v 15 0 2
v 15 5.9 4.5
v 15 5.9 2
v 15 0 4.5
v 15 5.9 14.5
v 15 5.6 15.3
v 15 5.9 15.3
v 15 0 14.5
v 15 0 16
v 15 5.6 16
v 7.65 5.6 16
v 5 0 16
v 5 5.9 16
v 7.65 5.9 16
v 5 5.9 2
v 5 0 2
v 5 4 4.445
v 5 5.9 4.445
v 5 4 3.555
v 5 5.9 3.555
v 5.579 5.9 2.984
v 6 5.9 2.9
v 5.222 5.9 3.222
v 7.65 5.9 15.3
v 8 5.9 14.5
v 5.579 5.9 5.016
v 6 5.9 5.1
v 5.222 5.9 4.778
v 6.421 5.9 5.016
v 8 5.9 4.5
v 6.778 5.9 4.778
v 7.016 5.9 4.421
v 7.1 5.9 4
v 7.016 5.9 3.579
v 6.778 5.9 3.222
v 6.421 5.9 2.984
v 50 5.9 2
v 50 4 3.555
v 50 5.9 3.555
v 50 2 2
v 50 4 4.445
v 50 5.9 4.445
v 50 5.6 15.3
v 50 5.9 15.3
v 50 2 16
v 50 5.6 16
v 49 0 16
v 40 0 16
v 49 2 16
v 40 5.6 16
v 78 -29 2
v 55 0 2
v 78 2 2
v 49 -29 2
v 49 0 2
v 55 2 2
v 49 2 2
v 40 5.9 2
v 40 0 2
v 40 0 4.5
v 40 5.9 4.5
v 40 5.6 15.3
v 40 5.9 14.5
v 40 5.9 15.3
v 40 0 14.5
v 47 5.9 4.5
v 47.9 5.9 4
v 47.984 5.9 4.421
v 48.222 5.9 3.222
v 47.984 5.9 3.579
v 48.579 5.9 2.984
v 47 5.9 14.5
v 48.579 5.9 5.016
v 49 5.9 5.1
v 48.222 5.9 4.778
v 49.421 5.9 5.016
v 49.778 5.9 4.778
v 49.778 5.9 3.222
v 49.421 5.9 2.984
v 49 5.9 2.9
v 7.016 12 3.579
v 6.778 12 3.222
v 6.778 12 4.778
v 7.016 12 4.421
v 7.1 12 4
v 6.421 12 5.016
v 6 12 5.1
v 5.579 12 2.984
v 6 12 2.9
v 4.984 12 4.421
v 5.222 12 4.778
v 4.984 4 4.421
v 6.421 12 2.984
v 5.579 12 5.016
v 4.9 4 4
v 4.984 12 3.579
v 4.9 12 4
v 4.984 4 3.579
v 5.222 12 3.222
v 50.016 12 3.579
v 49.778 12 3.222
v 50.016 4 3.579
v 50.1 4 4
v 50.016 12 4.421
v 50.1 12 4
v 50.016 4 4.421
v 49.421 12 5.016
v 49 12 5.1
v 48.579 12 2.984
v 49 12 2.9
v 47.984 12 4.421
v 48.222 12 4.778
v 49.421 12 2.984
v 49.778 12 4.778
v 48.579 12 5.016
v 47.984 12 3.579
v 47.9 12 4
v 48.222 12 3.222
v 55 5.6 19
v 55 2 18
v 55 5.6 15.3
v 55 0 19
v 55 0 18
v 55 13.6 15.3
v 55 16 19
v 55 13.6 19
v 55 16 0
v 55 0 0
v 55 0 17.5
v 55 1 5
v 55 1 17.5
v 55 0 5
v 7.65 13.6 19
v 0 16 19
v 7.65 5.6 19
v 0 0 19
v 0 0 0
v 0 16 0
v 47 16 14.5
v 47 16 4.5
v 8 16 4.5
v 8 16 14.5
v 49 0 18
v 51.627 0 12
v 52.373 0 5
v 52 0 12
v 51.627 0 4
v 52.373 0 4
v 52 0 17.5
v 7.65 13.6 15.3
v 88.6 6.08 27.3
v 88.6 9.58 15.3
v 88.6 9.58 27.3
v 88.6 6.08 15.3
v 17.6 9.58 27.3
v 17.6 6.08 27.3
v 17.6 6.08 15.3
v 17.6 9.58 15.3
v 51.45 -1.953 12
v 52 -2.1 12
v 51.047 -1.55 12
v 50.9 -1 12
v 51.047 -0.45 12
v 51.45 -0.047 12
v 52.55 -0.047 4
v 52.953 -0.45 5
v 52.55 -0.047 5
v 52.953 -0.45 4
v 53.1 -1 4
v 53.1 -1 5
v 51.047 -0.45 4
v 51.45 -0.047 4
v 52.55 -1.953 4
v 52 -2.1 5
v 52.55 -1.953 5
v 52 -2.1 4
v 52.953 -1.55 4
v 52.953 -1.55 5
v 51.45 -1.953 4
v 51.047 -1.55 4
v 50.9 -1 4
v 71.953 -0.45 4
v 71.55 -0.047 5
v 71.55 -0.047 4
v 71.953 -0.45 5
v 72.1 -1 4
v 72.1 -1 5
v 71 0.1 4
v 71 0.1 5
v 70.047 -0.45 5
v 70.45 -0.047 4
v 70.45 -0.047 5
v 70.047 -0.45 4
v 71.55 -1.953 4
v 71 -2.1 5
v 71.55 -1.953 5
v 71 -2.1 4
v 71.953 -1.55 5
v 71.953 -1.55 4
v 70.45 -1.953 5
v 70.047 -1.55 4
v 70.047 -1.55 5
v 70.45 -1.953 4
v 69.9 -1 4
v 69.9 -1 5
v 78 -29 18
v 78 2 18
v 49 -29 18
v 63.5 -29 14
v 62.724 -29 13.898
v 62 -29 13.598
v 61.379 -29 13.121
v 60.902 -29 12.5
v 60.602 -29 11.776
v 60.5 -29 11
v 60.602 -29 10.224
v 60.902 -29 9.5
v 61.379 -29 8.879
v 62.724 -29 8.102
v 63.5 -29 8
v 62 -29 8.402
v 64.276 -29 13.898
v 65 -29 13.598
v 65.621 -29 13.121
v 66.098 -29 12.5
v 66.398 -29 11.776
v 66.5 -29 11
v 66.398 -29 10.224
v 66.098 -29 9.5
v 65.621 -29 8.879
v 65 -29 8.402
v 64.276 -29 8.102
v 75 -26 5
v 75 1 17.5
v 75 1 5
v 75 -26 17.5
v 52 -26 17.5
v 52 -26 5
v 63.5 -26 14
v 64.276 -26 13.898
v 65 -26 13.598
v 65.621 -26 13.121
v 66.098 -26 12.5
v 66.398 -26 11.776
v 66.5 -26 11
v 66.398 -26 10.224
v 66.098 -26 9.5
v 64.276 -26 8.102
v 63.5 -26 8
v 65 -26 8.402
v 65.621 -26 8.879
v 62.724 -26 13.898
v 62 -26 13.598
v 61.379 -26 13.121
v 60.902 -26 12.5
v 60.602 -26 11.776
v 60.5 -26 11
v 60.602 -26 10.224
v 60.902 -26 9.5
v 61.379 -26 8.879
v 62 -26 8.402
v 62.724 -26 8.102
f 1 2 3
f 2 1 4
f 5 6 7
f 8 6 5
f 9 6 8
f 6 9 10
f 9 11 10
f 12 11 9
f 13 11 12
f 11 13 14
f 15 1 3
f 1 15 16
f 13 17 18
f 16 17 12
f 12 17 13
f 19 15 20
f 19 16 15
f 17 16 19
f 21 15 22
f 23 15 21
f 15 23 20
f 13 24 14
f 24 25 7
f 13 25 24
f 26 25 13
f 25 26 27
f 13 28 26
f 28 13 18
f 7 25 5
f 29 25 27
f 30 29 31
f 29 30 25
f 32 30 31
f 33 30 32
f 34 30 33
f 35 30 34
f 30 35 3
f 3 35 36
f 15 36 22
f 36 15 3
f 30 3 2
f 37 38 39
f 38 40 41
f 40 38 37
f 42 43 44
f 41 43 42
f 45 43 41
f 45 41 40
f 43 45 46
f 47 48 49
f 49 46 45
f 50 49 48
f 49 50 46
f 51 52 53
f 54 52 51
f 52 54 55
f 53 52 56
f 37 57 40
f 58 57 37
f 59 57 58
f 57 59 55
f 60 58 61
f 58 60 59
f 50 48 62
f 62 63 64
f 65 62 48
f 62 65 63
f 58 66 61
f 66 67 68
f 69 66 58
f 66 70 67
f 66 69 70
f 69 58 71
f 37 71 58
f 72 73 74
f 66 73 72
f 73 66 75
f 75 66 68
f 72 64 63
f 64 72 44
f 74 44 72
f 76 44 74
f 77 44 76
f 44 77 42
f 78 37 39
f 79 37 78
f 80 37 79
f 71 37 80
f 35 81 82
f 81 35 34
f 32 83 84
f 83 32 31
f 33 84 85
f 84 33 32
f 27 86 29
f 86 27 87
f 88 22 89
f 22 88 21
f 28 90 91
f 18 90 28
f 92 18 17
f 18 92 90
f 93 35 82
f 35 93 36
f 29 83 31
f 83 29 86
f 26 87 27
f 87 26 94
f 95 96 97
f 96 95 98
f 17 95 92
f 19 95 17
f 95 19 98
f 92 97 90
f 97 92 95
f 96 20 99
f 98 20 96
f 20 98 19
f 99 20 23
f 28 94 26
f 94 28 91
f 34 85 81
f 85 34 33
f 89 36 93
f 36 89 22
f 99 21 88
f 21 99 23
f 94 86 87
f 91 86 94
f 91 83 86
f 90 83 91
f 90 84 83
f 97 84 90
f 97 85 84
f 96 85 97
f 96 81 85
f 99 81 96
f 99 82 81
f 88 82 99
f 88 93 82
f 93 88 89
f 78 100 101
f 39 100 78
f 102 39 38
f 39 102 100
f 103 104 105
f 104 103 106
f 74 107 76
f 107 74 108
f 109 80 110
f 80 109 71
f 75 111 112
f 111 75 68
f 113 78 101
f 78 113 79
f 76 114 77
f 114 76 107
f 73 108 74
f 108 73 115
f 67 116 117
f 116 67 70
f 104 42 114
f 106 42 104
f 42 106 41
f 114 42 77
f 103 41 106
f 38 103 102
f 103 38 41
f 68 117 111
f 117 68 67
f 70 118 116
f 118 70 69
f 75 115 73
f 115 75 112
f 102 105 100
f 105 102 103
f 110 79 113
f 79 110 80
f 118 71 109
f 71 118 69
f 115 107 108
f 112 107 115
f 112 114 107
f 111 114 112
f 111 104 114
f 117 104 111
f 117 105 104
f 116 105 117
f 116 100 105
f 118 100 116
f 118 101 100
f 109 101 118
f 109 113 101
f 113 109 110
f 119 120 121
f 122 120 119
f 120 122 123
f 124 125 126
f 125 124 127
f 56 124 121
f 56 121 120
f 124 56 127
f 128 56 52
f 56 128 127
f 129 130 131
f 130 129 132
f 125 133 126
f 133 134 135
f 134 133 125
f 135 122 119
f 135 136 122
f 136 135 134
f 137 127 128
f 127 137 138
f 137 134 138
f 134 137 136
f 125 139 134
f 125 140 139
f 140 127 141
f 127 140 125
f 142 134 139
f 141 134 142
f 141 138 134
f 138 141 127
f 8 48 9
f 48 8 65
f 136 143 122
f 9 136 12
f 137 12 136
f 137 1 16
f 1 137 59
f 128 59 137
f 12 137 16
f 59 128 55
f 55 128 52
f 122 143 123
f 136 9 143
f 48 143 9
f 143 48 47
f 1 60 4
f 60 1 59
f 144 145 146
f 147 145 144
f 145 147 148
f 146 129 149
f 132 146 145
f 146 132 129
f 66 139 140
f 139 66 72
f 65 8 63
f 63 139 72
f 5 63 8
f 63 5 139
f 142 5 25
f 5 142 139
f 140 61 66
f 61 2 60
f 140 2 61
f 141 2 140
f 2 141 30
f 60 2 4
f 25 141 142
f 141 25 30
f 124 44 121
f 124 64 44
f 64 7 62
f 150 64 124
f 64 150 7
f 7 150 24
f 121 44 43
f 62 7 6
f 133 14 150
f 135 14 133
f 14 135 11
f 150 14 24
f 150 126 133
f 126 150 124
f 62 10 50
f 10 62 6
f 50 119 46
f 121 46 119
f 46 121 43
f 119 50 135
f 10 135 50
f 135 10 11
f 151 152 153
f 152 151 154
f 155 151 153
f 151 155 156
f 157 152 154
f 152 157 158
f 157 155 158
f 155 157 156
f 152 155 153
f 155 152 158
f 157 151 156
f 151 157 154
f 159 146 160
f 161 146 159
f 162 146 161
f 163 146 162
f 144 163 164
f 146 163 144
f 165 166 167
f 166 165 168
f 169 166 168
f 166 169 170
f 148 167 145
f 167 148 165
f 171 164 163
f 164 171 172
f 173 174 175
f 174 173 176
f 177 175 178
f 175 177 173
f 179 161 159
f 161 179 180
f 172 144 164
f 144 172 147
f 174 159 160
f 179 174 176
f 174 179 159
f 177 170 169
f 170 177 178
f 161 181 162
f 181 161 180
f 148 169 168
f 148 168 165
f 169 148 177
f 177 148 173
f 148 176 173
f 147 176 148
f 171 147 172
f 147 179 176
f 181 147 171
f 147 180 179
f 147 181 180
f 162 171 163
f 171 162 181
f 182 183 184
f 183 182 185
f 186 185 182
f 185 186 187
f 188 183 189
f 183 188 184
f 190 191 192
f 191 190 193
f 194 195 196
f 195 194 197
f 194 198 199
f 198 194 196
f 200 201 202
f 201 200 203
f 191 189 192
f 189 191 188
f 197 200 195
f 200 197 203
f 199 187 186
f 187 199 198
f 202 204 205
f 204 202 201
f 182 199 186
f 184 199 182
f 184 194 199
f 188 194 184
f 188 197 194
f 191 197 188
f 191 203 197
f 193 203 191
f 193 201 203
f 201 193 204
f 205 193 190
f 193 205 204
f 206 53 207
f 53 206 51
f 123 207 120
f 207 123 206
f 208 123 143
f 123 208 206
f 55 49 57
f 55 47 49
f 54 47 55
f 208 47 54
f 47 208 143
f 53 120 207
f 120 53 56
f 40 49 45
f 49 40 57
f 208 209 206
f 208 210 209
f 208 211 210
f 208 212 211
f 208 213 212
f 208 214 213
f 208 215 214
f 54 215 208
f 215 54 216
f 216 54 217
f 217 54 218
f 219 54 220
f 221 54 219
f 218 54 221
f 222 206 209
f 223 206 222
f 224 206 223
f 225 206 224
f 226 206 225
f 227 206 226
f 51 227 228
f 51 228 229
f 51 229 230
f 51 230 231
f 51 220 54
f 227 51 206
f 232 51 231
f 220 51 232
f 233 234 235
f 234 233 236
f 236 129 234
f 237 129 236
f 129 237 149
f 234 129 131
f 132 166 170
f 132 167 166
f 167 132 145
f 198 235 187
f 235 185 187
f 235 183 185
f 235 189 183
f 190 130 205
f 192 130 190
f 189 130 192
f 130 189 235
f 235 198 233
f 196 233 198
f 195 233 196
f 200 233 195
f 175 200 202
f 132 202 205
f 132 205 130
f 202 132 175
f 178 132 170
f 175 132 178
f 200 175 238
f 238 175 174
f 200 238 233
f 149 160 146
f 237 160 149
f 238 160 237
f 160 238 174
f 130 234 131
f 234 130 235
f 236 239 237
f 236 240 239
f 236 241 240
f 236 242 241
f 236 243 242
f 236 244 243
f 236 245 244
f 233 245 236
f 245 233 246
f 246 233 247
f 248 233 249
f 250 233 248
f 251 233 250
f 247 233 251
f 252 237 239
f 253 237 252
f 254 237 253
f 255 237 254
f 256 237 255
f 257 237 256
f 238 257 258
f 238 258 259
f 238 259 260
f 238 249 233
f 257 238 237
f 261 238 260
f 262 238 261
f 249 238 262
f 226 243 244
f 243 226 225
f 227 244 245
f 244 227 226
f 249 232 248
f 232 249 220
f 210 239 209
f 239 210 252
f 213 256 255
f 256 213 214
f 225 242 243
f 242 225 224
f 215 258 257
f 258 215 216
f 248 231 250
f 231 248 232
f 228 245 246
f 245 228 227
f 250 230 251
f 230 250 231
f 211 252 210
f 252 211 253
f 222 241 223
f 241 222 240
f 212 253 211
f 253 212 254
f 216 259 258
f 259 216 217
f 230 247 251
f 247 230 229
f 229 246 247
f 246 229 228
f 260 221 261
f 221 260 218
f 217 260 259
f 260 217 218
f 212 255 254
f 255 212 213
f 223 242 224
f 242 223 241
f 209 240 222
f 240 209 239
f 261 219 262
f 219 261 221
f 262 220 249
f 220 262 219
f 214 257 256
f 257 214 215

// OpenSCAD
// Koloni — Langstroth giriş kapısı (sürgülü, servo)
// OpenSCAD → STL. part: "cerceve" | "surgu" | "servo" | "montaj"

part = "montaj"; // varsayılan önizleme

// --- Langstroth uçuş deliği (mm) ---
slot_w = 39;
slot_h = 10;

// --- Çerçeve ---
frame_wall = 2.4;
frame_depth = 16;
frame_extra_w = 8;   // slot yan pay
frame_extra_h = 9;
frame_h = slot_h + frame_extra_h;

// --- Sürgü ---
slide_travel = 32;   // acik ↔ kapali kayma
slide_thick = 2.5;
slide_clear = 0.35;  // tolerans

// --- Servo SG90 ---
servo_w = 23;
servo_h = 12;
servo_d = 27;
servo_hole = 2.2;

module cerceve() {
  ow = slot_w + frame_extra_w * 2;
  oh = frame_h;
  difference() {
    cube([ow, frame_depth, oh]);
    // uçuş deliği
    translate([frame_extra_w, -0.1, frame_extra_h / 2])
      cube([slot_w, frame_depth + 0.2, slot_h]);
    // sürgü kanalı (üst)
    translate([frame_extra_w - slide_clear, frame_depth * 0.35, oh - slide_thick - 1.2])
      cube([slot_w + slide_travel + slide_clear * 2, frame_depth * 0.5, slide_thick + 1.5]);
    // IR yan kanalları (10 mm geniş yuva)
    for (x = [frame_extra_w - 3, frame_extra_w + slot_w - 7]) {
      translate([x, -0.1, 2])
        cube([10, 6, slot_h + 4]);
    }
    // montaj delikleri M3
    for (x = [6, ow - 6]) {
      translate([x, frame_depth - 4, 4])
        rotate([90, 0, 0])
          cylinder(h = 8, d = servo_hole, $fn = 16);
    }
  }
  // alt tahta hizalama dudak
  translate([frame_extra_w - 1, 0, 0])
    cube([slot_w + 2, 2, 1.2]);
}

module surgu_kapak() {
  // Kapak: soldan sağa kayarak deliği kapatır
  pw = slot_w + slide_travel;
  ph = slot_h + 2;
  cube([pw, slide_thick + 1, ph]);
  // servo kol bağlantı pimi
  translate([pw - 8, slide_thick + 1, ph / 2])
    rotate([90, 0, 0])
      cylinder(h = 3, d = 2.8, $fn = 20);
}

module servo_braket() {
  difference() {
    cube([servo_w + 6, servo_d + 4, servo_h + 4]);
    translate([3, 3, 3])
      cube([servo_w, servo_d, servo_h + 0.5]);
    // servo mil yuvası
    translate([3 + servo_w / 2, 3, 3 + servo_h / 2])
      rotate([90, 0, 0])
        cylinder(h = 6, d = 6, $fn = 24);
    // vida delikleri
    for (dx = [0, servo_w - 4]) {
      translate([3 + dx, 3 + servo_d - 2, 2])
        cylinder(h = 8, d = servo_hole, $fn = 12);
    }
  }
}

module montaj_onizleme() {
  color("DimGray") cerceve();
  color("Orange", 0.85)
    translate([frame_extra_w + slide_travel * 0.3, frame_depth * 0.38, oh - slide_thick - 1.2])
      surgu_kapak();
  color("SteelBlue")
    translate([frame_extra_w + slot_w + 2, -servo_d - 2, 2])
      servo_braket();
}

oh = frame_h;

if (part == "cerceve") {
  cerceve();
} else if (part == "surgu") {
  surgu_kapak();
} else if (part == "servo") {
  servo_braket();
} else {
  montaj_onizleme();
}
